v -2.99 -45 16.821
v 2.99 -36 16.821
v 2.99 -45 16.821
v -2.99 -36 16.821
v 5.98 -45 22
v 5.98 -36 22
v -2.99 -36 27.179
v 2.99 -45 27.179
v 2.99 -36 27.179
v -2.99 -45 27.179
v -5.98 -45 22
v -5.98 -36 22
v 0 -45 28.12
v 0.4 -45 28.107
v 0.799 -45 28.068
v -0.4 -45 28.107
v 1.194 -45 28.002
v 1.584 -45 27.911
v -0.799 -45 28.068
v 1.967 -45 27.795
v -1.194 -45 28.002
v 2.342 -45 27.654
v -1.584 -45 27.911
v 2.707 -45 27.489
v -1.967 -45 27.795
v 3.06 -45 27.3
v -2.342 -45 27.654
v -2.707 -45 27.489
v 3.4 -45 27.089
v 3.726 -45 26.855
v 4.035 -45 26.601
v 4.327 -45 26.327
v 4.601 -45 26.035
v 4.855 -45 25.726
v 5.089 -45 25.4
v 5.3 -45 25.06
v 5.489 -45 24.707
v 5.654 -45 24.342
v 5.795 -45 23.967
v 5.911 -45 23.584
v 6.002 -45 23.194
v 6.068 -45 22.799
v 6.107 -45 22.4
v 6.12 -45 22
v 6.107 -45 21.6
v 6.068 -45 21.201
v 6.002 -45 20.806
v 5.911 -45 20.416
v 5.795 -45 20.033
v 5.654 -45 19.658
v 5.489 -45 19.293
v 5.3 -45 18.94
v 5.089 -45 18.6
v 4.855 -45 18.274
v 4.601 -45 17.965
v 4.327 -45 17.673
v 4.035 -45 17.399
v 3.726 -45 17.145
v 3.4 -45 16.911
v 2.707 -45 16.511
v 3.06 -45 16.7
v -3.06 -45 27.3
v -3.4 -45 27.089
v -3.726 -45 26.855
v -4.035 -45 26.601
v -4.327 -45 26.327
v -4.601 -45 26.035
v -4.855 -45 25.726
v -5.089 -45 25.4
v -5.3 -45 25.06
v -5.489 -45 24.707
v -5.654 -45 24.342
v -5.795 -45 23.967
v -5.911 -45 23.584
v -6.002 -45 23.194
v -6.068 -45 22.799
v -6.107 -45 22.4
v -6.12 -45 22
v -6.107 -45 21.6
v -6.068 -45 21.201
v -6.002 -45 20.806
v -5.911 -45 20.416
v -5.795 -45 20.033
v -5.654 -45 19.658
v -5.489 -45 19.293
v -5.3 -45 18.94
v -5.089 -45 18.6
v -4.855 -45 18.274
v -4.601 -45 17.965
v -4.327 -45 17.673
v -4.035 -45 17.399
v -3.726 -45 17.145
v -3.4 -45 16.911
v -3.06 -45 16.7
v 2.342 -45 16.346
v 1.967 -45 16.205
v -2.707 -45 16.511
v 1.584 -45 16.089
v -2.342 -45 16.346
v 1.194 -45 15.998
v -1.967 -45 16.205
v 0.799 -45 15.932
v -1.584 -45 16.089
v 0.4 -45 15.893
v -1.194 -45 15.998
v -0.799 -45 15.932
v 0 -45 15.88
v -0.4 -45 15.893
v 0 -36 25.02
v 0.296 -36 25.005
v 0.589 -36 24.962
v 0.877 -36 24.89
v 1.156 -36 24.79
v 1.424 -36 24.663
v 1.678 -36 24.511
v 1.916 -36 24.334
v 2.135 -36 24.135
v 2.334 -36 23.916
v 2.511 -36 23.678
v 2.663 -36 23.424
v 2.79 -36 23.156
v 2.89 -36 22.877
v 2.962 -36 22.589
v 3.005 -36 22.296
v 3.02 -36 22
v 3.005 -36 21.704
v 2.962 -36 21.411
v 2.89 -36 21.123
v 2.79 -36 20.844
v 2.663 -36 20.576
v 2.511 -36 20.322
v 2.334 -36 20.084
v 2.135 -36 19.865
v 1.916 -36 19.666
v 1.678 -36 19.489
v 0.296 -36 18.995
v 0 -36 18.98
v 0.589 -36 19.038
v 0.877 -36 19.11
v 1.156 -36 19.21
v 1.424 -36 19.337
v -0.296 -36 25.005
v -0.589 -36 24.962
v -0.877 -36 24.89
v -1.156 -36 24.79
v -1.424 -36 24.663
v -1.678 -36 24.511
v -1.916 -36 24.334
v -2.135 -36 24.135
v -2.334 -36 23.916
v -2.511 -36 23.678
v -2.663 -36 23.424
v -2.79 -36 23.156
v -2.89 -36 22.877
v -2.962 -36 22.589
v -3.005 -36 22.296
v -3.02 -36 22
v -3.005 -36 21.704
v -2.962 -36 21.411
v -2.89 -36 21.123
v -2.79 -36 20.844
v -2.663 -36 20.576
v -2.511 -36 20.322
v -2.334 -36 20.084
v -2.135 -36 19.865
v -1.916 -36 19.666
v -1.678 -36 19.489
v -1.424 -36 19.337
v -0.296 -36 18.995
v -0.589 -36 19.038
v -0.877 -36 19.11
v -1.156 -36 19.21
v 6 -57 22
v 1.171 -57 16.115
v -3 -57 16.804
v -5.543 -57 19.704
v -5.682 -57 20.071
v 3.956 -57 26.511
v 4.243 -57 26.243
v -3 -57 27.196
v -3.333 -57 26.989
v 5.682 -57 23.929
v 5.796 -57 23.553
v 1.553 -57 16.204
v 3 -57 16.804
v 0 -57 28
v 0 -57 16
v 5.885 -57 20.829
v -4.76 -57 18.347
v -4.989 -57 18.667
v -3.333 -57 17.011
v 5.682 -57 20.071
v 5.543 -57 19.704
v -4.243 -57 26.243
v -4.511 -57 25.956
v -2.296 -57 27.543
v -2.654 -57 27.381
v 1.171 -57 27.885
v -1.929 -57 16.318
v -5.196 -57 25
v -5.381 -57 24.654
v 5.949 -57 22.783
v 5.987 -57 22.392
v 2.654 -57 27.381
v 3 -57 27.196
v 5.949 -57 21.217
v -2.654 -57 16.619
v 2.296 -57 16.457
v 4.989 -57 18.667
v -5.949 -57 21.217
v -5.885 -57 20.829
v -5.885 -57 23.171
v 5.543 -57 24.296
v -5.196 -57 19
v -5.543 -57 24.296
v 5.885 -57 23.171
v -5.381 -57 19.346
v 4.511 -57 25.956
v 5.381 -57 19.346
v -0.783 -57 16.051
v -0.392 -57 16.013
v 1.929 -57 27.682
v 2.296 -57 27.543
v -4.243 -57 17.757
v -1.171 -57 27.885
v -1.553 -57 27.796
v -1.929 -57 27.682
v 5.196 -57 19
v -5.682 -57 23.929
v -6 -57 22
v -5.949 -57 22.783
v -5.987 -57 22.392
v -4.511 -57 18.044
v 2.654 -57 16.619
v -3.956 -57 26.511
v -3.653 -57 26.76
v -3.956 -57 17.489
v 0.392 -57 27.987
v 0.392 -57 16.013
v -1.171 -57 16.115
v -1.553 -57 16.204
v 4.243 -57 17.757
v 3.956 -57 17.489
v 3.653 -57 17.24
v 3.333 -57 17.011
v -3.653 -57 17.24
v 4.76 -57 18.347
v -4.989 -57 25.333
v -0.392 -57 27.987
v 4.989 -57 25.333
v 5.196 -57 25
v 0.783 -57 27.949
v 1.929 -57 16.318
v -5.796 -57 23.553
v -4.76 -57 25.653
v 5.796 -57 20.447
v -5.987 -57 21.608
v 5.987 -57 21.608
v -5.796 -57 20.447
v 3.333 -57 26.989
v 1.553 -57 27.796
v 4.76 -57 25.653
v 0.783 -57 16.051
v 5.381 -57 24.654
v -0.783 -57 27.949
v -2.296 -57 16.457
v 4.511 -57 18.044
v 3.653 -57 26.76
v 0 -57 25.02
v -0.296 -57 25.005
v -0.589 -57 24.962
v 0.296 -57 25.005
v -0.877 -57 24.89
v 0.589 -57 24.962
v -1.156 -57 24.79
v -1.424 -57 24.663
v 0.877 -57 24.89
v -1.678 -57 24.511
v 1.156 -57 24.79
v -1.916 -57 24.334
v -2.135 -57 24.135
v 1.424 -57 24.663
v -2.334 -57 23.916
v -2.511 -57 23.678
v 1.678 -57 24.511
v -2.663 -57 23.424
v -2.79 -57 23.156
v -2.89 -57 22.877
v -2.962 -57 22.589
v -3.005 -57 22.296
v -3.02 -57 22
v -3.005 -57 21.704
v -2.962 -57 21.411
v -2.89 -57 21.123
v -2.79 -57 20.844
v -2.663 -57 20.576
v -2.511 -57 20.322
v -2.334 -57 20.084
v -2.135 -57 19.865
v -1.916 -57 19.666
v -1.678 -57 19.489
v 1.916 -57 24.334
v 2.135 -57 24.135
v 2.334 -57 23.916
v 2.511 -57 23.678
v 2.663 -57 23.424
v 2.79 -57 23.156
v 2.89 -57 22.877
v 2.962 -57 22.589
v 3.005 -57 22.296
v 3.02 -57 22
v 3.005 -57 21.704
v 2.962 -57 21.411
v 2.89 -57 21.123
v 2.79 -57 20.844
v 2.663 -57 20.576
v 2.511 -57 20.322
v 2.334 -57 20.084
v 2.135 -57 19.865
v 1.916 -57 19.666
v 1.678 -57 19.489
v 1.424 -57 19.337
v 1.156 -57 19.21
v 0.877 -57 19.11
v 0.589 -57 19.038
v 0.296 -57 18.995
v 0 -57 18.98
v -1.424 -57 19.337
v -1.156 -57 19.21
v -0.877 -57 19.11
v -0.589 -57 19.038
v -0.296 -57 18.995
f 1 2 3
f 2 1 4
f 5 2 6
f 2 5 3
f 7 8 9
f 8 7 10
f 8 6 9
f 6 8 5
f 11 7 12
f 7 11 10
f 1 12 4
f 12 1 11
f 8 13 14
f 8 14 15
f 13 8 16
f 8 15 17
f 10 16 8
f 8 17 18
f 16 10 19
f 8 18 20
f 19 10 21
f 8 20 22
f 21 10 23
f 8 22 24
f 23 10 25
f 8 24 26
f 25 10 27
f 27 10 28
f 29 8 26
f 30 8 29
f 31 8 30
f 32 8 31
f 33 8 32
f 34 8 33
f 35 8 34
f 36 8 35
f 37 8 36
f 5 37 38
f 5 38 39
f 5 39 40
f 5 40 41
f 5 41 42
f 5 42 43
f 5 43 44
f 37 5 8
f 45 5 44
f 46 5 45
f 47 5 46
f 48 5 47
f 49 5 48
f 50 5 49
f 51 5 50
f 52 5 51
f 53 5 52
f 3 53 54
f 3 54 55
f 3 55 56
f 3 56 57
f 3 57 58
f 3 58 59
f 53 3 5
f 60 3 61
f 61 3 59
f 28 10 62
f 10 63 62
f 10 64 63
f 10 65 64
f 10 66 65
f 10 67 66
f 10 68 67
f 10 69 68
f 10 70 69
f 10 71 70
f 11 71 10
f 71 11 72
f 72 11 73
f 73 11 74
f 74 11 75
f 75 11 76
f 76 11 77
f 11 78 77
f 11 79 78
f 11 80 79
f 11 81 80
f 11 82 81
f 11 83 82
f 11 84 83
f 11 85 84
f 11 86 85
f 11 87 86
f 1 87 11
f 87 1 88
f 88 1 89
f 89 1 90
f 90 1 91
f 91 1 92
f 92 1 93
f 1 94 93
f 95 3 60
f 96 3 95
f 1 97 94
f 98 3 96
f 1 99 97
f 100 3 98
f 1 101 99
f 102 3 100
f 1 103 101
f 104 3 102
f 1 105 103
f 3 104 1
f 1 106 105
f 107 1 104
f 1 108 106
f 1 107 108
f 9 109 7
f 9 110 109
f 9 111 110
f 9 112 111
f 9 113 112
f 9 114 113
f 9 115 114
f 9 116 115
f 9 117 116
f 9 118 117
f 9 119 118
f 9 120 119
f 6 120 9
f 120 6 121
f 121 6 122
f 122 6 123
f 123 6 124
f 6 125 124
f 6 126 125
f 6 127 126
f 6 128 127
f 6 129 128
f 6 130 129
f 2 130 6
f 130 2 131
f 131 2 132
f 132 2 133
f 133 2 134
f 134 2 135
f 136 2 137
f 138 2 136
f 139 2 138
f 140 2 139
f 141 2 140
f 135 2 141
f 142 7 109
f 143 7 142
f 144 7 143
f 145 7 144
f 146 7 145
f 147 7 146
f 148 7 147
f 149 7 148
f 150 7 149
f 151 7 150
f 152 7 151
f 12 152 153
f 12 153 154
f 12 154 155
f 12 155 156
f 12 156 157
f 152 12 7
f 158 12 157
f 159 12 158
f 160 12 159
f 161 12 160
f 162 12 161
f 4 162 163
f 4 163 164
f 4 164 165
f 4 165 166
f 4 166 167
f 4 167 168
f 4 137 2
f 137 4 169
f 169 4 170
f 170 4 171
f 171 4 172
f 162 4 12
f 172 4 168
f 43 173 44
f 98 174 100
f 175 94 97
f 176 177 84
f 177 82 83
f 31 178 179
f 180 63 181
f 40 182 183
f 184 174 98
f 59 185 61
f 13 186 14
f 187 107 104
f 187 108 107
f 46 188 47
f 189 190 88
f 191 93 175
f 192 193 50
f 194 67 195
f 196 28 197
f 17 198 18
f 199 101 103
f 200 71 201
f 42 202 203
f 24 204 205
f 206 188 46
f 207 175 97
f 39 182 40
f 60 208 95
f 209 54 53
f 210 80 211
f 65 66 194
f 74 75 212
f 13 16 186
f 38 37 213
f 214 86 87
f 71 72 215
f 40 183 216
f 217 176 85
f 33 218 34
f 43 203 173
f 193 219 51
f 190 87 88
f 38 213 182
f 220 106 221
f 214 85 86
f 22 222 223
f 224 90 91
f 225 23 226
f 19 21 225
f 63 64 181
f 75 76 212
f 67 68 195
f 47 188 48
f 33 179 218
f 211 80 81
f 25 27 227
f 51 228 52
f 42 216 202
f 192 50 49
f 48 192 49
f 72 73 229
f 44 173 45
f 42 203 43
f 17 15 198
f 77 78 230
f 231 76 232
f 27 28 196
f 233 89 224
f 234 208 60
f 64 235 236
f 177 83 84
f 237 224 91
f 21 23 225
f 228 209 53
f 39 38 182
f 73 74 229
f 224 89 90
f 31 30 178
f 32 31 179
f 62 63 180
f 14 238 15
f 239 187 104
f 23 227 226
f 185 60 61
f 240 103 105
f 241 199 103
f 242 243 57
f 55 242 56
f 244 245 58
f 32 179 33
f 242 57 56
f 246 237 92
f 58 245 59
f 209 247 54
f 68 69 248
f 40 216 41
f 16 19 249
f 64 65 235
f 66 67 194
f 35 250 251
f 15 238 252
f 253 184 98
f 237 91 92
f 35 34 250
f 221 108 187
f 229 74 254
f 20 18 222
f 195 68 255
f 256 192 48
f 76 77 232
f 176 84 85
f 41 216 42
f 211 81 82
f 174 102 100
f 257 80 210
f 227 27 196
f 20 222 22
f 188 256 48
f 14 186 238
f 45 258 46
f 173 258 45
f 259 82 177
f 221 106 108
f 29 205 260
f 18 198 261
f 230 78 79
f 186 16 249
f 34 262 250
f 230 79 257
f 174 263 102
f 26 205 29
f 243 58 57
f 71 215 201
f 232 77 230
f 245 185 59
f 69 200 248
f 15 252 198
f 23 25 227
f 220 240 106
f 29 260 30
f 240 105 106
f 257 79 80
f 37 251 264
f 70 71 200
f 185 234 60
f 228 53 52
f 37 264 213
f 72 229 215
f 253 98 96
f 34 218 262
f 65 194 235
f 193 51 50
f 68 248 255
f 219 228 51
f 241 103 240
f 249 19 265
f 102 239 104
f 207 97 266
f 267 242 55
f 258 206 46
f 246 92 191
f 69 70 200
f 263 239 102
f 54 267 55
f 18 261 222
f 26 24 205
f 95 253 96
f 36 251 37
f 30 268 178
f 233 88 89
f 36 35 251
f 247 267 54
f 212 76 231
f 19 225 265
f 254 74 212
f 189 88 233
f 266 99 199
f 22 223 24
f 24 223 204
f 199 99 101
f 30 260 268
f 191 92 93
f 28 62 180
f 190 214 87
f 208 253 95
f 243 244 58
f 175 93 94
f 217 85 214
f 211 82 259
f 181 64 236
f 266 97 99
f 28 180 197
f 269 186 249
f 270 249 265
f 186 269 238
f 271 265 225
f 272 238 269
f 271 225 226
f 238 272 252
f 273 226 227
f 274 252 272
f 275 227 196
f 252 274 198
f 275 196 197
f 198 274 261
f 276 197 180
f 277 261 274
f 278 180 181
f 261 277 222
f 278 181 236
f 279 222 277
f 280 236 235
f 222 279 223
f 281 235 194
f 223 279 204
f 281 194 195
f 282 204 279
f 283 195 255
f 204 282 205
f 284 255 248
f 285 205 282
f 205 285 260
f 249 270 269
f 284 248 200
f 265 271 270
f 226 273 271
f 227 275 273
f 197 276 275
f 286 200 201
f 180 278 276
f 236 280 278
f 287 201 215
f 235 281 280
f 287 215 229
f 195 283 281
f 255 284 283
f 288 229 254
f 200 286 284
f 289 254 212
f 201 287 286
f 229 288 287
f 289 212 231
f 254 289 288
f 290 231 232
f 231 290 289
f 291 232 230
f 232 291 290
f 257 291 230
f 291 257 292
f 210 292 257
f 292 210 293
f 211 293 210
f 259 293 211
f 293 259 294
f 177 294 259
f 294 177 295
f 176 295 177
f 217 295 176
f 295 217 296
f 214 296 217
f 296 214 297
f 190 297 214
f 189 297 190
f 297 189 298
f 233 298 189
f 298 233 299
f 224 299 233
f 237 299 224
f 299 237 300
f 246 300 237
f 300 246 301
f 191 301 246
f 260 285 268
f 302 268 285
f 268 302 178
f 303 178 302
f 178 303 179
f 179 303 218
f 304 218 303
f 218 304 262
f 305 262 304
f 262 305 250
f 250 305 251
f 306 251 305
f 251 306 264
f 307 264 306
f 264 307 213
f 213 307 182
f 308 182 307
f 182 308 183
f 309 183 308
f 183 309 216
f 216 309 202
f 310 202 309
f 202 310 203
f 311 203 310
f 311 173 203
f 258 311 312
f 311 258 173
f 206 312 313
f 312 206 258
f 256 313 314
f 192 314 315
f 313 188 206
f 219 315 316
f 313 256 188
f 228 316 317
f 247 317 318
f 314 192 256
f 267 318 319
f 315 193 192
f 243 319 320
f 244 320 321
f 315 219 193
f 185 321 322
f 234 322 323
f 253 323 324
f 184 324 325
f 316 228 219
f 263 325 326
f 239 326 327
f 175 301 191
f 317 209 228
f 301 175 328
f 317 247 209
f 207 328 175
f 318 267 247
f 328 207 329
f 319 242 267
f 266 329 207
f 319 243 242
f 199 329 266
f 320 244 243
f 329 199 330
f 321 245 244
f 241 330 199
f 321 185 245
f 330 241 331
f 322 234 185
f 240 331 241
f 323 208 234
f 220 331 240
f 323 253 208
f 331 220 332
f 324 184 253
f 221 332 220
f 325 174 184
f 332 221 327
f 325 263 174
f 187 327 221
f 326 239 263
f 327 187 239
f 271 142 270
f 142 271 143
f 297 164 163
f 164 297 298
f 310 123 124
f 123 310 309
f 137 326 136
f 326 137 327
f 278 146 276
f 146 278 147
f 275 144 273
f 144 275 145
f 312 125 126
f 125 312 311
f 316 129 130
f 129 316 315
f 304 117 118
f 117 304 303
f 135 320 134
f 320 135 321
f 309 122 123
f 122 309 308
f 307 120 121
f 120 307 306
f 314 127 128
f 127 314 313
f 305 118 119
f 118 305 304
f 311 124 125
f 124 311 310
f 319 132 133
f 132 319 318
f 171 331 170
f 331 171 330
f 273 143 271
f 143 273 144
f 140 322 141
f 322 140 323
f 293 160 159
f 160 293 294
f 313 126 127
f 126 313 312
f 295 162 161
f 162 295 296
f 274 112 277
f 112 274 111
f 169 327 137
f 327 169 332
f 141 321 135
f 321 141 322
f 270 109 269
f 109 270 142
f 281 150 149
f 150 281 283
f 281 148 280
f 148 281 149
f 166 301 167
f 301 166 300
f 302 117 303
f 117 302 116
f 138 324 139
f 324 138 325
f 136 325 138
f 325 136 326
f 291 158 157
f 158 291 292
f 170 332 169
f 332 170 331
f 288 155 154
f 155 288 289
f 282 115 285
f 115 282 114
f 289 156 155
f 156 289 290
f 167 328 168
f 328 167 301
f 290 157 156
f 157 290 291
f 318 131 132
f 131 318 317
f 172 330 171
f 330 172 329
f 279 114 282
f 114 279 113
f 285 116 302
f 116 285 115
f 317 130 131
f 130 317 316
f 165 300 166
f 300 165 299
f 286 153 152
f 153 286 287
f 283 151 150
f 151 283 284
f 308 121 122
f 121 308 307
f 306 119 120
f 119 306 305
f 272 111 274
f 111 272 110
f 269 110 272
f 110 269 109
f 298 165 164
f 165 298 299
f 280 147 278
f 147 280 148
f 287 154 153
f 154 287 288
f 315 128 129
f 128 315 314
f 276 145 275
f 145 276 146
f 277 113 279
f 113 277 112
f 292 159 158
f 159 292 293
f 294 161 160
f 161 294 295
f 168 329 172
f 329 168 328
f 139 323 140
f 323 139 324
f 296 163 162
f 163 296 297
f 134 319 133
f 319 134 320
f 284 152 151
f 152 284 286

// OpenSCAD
// Hour shaft
// October 2020

TAPER_PER_MM = 1/50;  // 1 mm diameter per 50 mm length

L1 = 9;                     // Hex length
Z2 = L1;                    // Z coordinate of base of taper
taper_len = 12;             // Taper length
taper_diam = 12;            // Diameter at distal end of the shaft.
// Proximal diameter at base of taper
taper_root_diam = taper_diam + taper_len*TAPER_PER_MM;

// Orient as in the assembly model.
translate([0,-36,22])
rotate([90,0,0])
{
    difference()
    {
        union()
        {
            // Hex head is driven by the 48T wheel (driven, in turn, by the pulley).
            // For legacy reasons, the diameter is not specified between parallel flats
            //TODO Bevel
            cylinder(h=L1, d=12 - 0.04, $fn=6);
            translate([0,0,L1])
            {
                // Tapered shaft for hour hand.
                cylinder(h=taper_len, d1=taper_root_diam, d2=taper_diam, $fn=96);
            }
        }
        // Bore through to ride on the minute shaft.
        translate([0,0,-500])
        cylinder(h = 1000, d = 6.04, $fn=64);
    }
}


// Taper calculator for bores.  The bottom of the hole is always less
// than the nominal dimaeter.
function taper_calculator(length, nominal_diam, overdeep) = 
    [
        // Diameter at the bottom of the hole:
        nominal_diam - (overdeep * TAPER_PER_MM),
        // Outer diameter:
        nominal_diam + (length - overdeep) * TAPER_PER_MM,
    ];
